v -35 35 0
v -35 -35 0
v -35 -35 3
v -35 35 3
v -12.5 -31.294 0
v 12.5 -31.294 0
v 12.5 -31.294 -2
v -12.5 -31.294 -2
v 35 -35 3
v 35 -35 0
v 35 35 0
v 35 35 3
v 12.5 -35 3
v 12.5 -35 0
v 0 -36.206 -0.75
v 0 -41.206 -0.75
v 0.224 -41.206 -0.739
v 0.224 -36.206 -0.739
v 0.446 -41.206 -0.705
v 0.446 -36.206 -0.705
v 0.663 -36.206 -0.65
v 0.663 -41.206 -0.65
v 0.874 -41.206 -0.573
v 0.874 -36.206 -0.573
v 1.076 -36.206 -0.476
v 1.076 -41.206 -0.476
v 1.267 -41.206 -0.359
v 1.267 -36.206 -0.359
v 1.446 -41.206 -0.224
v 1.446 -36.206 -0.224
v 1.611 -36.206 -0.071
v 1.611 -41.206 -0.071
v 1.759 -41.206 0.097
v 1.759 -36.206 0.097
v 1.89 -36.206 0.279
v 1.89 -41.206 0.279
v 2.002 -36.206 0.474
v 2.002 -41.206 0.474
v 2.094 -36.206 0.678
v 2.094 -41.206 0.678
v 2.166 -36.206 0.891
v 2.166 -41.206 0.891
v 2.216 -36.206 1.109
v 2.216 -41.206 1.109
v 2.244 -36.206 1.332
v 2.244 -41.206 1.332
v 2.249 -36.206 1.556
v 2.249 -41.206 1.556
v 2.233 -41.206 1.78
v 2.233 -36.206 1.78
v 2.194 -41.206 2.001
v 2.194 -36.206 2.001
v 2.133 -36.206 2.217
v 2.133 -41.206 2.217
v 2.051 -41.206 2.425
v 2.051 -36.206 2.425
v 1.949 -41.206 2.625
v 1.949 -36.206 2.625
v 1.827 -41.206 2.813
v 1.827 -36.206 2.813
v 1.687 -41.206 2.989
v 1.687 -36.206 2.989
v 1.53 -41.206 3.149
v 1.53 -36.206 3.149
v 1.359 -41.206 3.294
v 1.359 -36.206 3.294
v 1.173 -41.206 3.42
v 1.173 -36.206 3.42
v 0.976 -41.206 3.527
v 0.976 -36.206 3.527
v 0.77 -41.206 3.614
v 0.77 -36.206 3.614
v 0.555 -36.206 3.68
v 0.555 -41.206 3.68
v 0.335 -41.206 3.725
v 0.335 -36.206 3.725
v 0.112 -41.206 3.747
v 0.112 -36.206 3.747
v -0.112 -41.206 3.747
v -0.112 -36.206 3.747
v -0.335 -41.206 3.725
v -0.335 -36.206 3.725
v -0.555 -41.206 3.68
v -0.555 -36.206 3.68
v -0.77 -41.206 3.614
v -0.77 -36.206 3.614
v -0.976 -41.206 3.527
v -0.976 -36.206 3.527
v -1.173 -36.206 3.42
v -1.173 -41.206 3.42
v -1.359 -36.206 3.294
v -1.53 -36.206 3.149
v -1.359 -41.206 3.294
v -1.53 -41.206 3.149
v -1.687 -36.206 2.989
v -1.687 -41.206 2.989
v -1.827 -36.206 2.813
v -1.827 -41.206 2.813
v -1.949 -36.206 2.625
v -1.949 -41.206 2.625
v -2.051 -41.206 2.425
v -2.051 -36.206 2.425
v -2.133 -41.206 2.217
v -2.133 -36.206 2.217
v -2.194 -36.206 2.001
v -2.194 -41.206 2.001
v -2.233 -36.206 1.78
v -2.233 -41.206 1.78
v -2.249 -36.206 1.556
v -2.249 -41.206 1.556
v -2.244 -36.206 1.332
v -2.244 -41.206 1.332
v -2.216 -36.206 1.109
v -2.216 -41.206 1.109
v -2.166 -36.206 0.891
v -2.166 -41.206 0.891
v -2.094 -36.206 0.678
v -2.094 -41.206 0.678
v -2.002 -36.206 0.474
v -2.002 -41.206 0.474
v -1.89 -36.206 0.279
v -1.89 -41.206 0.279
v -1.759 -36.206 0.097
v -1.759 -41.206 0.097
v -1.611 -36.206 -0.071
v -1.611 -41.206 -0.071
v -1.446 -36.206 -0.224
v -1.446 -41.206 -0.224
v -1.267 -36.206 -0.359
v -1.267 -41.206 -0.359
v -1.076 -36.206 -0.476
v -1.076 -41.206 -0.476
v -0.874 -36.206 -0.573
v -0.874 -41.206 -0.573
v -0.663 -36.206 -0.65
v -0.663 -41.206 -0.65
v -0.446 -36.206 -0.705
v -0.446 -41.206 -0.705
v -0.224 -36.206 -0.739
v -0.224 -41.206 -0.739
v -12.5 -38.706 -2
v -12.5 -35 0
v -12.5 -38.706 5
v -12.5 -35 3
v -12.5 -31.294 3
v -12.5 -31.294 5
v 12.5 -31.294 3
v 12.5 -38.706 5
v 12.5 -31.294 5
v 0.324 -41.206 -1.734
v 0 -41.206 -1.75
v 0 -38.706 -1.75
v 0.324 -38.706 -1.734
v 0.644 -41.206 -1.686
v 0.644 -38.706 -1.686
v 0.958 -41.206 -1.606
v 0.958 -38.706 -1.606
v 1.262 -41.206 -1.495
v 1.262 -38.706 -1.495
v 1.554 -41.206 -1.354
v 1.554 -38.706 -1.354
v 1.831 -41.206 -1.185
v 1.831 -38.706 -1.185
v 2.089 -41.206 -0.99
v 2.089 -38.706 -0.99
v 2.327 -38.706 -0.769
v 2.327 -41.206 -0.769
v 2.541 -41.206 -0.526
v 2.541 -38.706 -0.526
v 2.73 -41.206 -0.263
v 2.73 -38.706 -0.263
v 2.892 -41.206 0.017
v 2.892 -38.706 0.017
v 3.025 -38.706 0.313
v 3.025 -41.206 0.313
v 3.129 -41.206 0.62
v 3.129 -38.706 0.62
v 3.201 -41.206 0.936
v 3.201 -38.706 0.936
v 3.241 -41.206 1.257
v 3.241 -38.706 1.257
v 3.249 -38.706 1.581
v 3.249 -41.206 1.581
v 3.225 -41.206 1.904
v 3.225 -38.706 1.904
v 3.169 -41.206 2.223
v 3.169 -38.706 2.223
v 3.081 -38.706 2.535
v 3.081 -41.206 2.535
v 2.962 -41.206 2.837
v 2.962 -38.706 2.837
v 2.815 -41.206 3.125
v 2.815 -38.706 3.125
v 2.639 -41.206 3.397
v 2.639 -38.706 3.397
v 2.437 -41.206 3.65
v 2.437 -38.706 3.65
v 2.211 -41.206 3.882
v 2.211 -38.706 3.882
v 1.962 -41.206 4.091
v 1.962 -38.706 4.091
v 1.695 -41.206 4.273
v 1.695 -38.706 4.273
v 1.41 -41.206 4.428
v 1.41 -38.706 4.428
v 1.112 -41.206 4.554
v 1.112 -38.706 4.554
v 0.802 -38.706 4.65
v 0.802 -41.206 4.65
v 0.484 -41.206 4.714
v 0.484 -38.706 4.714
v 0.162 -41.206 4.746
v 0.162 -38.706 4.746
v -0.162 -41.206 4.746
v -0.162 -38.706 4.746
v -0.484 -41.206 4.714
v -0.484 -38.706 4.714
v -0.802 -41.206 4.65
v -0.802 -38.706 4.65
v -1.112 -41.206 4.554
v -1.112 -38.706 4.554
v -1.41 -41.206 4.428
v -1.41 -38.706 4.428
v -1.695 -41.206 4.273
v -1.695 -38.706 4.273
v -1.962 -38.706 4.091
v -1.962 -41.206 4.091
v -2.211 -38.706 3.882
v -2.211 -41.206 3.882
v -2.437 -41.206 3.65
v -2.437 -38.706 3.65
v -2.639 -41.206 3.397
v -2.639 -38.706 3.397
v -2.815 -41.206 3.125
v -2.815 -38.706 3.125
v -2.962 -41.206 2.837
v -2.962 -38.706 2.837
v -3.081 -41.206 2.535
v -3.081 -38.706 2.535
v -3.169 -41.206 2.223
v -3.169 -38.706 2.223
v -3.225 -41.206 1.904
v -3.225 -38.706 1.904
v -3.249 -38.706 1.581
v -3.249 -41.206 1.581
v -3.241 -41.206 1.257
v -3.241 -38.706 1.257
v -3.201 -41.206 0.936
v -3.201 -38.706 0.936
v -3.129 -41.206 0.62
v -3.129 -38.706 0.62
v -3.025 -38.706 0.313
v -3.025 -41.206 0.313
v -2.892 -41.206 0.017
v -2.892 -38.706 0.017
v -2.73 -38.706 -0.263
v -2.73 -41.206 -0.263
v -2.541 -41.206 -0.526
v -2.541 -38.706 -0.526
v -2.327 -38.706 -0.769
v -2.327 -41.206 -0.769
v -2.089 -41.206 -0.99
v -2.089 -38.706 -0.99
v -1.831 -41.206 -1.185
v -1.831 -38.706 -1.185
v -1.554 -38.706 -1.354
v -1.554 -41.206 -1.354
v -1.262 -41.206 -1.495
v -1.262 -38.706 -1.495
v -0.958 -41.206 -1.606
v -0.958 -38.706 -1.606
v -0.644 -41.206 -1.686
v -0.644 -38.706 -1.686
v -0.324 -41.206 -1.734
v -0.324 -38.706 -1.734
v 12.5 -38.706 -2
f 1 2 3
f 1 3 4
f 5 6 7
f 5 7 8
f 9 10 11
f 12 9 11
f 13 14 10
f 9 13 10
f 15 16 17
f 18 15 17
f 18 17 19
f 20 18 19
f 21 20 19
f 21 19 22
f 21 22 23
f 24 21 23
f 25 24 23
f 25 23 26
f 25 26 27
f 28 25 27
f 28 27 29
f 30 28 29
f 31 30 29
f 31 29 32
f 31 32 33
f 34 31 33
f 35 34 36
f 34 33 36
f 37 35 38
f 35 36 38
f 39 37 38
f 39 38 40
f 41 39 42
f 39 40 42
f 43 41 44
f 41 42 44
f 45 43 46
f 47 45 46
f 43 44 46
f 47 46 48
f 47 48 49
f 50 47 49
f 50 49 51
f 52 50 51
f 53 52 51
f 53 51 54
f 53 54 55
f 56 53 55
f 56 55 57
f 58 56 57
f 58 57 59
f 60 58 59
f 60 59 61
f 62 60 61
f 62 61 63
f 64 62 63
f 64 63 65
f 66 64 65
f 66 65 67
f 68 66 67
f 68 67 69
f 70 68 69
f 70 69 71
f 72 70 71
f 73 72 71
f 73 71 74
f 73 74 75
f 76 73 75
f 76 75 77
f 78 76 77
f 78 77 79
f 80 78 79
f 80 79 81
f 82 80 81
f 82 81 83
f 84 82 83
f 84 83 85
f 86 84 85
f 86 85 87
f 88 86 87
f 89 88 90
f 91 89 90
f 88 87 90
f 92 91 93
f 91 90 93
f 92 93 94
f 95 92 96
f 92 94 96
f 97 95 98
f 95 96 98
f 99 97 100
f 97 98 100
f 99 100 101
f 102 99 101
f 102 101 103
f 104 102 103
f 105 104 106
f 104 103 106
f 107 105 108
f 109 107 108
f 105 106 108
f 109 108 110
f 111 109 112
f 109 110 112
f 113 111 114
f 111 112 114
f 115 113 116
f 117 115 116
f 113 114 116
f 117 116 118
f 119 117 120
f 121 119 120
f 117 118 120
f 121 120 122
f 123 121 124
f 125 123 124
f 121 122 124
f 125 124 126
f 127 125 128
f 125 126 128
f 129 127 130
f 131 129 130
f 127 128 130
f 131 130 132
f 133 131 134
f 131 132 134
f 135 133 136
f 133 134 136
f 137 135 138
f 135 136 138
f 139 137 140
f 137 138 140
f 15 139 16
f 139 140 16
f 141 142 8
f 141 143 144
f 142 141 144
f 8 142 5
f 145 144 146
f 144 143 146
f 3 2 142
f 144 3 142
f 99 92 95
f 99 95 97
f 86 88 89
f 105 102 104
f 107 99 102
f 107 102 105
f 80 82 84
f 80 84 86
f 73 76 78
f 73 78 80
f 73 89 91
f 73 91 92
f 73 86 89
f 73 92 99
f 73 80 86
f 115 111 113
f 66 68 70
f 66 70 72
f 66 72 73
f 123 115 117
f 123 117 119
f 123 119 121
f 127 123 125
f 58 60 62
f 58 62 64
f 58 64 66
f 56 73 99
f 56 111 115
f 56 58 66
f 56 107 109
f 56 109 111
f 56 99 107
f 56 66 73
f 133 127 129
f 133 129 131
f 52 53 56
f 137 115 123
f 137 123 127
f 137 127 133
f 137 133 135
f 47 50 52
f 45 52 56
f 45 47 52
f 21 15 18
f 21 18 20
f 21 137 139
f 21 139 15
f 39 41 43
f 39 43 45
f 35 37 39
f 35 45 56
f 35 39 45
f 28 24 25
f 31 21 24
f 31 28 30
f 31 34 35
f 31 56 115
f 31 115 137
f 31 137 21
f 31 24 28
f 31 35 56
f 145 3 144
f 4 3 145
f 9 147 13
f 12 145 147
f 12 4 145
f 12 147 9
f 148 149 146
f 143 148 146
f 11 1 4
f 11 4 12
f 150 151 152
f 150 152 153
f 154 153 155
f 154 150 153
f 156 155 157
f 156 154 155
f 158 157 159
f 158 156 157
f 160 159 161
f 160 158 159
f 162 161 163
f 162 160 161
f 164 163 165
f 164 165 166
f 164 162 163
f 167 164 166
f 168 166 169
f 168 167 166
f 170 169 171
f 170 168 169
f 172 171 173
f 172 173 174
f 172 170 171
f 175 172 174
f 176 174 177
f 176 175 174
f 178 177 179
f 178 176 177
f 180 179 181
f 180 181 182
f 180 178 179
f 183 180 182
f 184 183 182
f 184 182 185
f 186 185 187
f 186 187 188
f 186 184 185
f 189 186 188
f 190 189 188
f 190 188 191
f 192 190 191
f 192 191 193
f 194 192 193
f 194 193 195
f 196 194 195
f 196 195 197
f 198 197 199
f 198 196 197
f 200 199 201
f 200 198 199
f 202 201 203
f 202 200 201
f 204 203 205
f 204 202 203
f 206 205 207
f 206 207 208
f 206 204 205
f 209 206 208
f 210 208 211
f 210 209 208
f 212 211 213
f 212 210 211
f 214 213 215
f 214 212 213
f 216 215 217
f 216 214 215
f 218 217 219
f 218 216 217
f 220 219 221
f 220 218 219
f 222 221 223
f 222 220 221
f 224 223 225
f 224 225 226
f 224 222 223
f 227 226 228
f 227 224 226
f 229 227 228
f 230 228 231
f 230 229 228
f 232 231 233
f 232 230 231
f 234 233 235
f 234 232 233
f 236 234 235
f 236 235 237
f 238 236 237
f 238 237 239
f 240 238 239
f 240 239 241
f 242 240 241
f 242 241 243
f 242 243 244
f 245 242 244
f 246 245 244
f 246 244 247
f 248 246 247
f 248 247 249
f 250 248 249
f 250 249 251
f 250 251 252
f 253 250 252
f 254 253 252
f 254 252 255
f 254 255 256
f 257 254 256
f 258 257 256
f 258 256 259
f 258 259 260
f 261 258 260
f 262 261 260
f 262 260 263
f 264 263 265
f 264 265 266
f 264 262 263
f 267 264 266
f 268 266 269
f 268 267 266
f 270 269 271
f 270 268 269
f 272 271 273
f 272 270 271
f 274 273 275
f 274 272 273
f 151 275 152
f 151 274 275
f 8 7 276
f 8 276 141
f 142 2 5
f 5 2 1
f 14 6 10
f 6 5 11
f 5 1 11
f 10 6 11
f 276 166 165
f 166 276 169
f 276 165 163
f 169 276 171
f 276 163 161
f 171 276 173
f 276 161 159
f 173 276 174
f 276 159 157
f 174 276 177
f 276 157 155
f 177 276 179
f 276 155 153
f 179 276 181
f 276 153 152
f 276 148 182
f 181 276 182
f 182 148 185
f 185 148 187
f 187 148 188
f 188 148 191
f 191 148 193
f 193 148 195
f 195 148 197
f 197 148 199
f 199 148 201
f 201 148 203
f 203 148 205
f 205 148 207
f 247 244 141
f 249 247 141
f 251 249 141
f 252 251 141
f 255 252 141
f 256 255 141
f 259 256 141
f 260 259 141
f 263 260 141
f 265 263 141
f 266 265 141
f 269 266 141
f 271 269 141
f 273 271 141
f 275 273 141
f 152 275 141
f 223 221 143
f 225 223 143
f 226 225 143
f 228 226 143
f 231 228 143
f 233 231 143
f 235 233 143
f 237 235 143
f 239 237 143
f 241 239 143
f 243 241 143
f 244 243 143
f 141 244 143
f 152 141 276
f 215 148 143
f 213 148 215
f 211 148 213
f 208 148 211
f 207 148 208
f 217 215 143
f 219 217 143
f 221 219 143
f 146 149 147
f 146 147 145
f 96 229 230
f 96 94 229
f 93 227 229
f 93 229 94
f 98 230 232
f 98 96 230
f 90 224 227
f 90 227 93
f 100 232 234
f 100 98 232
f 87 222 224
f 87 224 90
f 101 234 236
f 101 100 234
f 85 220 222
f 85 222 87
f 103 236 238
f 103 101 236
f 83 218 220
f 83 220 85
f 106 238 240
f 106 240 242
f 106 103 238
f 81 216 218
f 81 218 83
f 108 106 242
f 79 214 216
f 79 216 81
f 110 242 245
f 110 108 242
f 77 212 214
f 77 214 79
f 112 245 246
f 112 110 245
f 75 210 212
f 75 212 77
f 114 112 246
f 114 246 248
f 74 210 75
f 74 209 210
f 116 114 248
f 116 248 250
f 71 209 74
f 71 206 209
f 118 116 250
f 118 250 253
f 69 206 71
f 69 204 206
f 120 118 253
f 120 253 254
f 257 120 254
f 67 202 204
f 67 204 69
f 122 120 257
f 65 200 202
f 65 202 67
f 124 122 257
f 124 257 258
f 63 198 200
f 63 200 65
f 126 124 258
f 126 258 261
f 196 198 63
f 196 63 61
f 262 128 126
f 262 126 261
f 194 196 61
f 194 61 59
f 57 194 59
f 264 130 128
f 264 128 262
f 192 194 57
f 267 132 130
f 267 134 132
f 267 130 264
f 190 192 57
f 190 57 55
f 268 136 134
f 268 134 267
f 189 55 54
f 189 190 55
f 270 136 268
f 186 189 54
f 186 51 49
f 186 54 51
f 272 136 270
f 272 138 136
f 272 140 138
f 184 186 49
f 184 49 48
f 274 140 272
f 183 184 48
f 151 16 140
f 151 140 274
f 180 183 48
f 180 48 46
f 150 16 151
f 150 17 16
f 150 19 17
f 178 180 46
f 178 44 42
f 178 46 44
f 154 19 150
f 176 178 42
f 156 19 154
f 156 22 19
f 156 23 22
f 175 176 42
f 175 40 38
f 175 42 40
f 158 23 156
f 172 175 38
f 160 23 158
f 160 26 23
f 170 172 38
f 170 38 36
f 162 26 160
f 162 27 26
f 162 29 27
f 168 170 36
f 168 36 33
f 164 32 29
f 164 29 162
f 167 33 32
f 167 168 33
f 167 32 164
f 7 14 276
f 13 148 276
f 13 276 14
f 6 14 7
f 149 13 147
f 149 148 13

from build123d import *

# Parameters (mm, degrees)
SKETCH1_W                = 70
SKETCH1_H                = 70
BOSS_EXTRUDE1_DEPTH      = 3
BOSS_EXTRUDE2_DEPTH      = 2
BOSS_EXTRUDE2_DEPTH_BACK = 5
SKETCH2_W                = 25
SKETCH2_H                = 7.41284488
SKETCH3_R                = 2.25
CUT_EXTRUDE1_DEPTH       = 2.5
BOSS_EXTRUDE3_START      = 2.5
SKETCH4_R                = 3.25
SKETCH4_R_2              = 2.25
BOSS_EXTRUDE3_DEPTH      = 2.5


with BuildPart() as part:
    # Sketch1 → Boss-Extrude1 (new body)
    with BuildSketch(Plane.XY):
        Rectangle(SKETCH1_W, SKETCH1_H)
    extrude(amount=BOSS_EXTRUDE1_DEPTH)

    # Sketch2 → Boss-Extrude2 (add, two sides: drawn at the far end of the back side and taken through both)
    with BuildSketch(Plane(origin=(0, 0, 0), x_dir=(-1, 0, 0), z_dir=(0, 0, -1)).offset(-BOSS_EXTRUDE2_DEPTH_BACK)):
        with Locations((0, -35)):
            Rectangle(SKETCH2_W, SKETCH2_H)
    extrude(amount=BOSS_EXTRUDE2_DEPTH + BOSS_EXTRUDE2_DEPTH_BACK)

    # Sketch3 → Cut-Extrude1 (cut)
    with BuildSketch(Plane.XZ.offset(38.70642244)):
        with Locations(Location((0, 1.5, 0), (0, 0, 270))):
            Circle(SKETCH3_R)
    extrude(amount=-CUT_EXTRUDE1_DEPTH, mode=Mode.SUBTRACT)

    # Sketch4 → Boss-Extrude3 (add)
    with BuildSketch(Plane.XZ.offset(38.70642244).offset(BOSS_EXTRUDE3_START)):
        with Locations(Location((0, 1.5, 0), (0, 0, 270))):
            Circle(SKETCH4_R)
        with Locations(Location((0, 1.5, 0), (0, 0, 270))):
            Circle(SKETCH4_R_2, mode=Mode.SUBTRACT)
    extrude(amount=-BOSS_EXTRUDE3_DEPTH)


solid = part.part
